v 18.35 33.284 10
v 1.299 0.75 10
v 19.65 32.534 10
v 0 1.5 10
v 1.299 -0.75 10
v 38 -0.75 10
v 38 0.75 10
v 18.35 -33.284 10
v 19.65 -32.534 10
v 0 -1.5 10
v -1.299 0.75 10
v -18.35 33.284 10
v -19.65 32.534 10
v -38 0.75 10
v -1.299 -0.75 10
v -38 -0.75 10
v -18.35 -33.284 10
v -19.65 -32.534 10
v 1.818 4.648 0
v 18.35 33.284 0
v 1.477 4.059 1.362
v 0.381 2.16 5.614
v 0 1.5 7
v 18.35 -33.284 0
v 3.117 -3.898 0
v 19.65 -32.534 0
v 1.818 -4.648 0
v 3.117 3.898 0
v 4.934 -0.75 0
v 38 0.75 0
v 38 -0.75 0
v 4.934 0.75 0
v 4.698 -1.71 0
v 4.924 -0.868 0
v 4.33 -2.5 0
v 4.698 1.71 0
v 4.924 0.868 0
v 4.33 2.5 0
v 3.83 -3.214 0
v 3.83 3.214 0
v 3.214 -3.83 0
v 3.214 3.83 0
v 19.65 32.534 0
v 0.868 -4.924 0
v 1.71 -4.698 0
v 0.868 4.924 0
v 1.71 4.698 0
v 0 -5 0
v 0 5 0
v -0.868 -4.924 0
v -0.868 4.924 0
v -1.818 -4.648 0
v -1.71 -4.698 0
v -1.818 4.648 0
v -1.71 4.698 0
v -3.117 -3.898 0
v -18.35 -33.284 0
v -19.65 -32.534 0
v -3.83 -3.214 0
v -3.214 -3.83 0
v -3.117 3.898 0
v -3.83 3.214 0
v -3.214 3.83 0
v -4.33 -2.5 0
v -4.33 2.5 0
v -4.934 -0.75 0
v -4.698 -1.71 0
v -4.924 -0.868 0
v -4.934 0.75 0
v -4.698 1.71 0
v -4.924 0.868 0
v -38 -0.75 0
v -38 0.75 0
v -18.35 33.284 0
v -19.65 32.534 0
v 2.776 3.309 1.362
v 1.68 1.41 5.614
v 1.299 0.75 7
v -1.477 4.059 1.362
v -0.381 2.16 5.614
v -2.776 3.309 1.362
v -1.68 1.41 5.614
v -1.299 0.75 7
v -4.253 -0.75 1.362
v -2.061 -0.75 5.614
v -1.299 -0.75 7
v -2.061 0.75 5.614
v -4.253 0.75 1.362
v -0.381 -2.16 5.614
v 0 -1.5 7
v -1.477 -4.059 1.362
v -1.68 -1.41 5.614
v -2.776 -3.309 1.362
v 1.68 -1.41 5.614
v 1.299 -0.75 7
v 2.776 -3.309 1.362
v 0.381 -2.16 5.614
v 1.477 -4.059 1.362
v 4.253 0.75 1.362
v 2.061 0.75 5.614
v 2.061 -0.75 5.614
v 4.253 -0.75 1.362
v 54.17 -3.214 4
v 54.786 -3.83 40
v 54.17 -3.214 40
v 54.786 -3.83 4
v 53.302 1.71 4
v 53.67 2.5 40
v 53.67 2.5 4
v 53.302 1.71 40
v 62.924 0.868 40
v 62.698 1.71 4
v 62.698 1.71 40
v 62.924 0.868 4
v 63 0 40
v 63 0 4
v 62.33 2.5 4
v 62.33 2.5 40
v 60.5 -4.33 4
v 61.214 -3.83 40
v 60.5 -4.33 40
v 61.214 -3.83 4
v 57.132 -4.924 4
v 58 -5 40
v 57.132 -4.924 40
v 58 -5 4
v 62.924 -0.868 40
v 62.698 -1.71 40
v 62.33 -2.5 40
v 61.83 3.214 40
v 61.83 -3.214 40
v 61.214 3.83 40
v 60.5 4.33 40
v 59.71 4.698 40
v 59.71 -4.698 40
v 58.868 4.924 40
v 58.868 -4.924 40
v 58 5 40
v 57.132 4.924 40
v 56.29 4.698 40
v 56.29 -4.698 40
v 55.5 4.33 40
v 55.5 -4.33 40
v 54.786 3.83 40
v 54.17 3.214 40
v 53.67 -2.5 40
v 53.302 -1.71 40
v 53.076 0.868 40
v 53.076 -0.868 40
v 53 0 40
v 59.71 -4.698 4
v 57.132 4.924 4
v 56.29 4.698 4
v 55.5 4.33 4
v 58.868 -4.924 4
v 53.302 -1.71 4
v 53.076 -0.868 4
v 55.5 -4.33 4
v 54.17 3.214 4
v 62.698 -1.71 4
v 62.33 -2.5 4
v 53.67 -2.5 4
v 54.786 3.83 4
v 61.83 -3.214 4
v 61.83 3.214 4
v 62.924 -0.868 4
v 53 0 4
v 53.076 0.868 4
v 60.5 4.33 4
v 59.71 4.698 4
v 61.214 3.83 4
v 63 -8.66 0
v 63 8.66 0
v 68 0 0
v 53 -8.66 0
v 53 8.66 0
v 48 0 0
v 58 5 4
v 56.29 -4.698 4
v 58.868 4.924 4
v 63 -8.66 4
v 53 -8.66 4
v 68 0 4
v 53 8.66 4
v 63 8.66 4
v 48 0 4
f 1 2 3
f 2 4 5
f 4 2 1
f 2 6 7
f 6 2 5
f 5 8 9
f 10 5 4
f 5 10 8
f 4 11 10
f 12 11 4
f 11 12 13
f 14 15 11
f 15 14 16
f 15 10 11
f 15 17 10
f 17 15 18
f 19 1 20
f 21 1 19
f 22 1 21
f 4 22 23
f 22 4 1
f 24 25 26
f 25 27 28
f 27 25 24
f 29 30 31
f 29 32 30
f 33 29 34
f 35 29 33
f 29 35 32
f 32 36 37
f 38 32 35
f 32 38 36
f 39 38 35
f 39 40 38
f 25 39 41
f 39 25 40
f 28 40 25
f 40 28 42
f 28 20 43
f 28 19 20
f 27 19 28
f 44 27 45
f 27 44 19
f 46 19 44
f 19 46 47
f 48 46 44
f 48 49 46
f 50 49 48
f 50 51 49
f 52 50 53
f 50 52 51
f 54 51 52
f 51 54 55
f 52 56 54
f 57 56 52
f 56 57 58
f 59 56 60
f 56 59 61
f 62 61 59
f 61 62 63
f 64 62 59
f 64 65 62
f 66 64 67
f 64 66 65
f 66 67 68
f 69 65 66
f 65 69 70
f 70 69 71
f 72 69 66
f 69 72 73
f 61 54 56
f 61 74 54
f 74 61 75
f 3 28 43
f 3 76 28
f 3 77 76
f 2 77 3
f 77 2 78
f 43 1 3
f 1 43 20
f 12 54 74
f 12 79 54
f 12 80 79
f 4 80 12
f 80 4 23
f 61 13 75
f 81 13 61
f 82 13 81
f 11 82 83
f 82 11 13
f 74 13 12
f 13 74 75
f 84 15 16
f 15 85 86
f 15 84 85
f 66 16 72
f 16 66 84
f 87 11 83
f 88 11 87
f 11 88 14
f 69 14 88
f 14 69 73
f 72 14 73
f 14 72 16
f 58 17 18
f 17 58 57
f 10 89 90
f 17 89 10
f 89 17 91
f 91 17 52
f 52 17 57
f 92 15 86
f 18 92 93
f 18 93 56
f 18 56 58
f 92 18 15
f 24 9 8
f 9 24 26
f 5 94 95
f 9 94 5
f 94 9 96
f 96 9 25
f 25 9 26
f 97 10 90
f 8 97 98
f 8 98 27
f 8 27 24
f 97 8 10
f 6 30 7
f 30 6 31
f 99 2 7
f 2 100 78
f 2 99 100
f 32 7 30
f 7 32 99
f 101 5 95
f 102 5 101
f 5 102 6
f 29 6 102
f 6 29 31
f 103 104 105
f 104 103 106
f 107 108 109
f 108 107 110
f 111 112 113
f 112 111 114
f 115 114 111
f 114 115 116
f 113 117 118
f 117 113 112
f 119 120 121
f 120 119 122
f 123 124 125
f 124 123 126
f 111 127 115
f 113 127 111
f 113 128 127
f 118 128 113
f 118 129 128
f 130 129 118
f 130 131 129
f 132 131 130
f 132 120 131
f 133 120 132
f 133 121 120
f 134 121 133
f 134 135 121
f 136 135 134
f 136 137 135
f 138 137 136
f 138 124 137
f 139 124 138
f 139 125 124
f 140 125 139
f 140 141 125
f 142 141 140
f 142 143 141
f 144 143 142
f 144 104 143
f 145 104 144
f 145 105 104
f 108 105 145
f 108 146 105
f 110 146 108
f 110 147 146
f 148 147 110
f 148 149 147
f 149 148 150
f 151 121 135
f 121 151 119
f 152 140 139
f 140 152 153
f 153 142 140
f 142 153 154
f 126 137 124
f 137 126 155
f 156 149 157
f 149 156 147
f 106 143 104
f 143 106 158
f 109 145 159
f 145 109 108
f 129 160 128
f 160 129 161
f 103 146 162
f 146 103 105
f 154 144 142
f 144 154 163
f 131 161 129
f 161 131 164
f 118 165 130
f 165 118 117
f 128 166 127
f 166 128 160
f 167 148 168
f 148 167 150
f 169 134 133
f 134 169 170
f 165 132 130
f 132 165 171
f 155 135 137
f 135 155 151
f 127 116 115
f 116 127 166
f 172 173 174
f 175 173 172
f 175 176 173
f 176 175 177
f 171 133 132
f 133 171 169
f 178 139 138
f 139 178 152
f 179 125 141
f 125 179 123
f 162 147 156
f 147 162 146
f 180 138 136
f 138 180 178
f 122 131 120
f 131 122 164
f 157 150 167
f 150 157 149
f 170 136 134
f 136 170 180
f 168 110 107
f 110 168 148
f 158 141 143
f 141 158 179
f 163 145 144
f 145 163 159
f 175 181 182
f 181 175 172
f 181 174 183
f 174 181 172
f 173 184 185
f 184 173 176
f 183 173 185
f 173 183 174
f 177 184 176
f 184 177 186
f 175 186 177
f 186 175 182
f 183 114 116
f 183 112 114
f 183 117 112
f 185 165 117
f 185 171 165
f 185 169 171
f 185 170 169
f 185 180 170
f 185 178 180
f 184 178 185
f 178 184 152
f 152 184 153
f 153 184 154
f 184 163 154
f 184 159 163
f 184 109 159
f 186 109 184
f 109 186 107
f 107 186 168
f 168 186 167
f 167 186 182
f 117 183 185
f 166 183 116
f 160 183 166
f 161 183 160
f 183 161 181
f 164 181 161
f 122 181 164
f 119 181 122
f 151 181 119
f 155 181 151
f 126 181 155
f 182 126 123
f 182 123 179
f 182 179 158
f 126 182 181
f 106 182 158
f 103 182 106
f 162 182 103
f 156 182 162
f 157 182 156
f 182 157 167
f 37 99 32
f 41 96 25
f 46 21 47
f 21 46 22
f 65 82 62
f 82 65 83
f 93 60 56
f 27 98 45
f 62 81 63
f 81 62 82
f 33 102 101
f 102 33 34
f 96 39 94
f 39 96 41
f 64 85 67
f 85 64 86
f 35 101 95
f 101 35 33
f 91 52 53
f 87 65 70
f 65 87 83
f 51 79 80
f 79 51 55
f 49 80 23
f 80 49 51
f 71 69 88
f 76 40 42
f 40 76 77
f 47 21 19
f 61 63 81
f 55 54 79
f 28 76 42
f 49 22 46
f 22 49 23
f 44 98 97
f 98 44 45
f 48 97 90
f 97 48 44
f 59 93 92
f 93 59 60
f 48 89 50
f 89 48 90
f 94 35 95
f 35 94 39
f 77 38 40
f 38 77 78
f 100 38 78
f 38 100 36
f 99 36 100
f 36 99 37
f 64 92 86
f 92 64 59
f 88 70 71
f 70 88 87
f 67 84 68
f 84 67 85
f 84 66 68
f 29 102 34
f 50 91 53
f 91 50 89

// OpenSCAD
// Pet Food Slicer
// Hari Wiguna, 2014

sliceDiameter = 76;
sliceRadius = sliceDiameter/2;
sliceCount = 6;
sliceHeight = 10; //41;
thickness = 1.5;

stemRadius = 5;
stemHeight = 40;
handleRadius = 10;
handleHeight = 4;

$fn = 36;

union() {

	//-- Slicers --
	for (r=[1:sliceCount])
	{
		rotate(360*r/sliceCount,[0,0,1])
			translate([0,-thickness/2,0])
				cube([sliceRadius,thickness,sliceHeight]);
	}

	//-- Stem base --
	cylinder(sliceHeight,stemRadius,0);

	//-- Handle --
	translate([sliceRadius+handleRadius+10,0,0]) 
		Handle();
}


module Handle()
{
	union() {
		cylinder(stemHeight,stemRadius,stemRadius);
		cylinder(h=handleHeight,r=handleRadius, $fn=6);
	}
}
